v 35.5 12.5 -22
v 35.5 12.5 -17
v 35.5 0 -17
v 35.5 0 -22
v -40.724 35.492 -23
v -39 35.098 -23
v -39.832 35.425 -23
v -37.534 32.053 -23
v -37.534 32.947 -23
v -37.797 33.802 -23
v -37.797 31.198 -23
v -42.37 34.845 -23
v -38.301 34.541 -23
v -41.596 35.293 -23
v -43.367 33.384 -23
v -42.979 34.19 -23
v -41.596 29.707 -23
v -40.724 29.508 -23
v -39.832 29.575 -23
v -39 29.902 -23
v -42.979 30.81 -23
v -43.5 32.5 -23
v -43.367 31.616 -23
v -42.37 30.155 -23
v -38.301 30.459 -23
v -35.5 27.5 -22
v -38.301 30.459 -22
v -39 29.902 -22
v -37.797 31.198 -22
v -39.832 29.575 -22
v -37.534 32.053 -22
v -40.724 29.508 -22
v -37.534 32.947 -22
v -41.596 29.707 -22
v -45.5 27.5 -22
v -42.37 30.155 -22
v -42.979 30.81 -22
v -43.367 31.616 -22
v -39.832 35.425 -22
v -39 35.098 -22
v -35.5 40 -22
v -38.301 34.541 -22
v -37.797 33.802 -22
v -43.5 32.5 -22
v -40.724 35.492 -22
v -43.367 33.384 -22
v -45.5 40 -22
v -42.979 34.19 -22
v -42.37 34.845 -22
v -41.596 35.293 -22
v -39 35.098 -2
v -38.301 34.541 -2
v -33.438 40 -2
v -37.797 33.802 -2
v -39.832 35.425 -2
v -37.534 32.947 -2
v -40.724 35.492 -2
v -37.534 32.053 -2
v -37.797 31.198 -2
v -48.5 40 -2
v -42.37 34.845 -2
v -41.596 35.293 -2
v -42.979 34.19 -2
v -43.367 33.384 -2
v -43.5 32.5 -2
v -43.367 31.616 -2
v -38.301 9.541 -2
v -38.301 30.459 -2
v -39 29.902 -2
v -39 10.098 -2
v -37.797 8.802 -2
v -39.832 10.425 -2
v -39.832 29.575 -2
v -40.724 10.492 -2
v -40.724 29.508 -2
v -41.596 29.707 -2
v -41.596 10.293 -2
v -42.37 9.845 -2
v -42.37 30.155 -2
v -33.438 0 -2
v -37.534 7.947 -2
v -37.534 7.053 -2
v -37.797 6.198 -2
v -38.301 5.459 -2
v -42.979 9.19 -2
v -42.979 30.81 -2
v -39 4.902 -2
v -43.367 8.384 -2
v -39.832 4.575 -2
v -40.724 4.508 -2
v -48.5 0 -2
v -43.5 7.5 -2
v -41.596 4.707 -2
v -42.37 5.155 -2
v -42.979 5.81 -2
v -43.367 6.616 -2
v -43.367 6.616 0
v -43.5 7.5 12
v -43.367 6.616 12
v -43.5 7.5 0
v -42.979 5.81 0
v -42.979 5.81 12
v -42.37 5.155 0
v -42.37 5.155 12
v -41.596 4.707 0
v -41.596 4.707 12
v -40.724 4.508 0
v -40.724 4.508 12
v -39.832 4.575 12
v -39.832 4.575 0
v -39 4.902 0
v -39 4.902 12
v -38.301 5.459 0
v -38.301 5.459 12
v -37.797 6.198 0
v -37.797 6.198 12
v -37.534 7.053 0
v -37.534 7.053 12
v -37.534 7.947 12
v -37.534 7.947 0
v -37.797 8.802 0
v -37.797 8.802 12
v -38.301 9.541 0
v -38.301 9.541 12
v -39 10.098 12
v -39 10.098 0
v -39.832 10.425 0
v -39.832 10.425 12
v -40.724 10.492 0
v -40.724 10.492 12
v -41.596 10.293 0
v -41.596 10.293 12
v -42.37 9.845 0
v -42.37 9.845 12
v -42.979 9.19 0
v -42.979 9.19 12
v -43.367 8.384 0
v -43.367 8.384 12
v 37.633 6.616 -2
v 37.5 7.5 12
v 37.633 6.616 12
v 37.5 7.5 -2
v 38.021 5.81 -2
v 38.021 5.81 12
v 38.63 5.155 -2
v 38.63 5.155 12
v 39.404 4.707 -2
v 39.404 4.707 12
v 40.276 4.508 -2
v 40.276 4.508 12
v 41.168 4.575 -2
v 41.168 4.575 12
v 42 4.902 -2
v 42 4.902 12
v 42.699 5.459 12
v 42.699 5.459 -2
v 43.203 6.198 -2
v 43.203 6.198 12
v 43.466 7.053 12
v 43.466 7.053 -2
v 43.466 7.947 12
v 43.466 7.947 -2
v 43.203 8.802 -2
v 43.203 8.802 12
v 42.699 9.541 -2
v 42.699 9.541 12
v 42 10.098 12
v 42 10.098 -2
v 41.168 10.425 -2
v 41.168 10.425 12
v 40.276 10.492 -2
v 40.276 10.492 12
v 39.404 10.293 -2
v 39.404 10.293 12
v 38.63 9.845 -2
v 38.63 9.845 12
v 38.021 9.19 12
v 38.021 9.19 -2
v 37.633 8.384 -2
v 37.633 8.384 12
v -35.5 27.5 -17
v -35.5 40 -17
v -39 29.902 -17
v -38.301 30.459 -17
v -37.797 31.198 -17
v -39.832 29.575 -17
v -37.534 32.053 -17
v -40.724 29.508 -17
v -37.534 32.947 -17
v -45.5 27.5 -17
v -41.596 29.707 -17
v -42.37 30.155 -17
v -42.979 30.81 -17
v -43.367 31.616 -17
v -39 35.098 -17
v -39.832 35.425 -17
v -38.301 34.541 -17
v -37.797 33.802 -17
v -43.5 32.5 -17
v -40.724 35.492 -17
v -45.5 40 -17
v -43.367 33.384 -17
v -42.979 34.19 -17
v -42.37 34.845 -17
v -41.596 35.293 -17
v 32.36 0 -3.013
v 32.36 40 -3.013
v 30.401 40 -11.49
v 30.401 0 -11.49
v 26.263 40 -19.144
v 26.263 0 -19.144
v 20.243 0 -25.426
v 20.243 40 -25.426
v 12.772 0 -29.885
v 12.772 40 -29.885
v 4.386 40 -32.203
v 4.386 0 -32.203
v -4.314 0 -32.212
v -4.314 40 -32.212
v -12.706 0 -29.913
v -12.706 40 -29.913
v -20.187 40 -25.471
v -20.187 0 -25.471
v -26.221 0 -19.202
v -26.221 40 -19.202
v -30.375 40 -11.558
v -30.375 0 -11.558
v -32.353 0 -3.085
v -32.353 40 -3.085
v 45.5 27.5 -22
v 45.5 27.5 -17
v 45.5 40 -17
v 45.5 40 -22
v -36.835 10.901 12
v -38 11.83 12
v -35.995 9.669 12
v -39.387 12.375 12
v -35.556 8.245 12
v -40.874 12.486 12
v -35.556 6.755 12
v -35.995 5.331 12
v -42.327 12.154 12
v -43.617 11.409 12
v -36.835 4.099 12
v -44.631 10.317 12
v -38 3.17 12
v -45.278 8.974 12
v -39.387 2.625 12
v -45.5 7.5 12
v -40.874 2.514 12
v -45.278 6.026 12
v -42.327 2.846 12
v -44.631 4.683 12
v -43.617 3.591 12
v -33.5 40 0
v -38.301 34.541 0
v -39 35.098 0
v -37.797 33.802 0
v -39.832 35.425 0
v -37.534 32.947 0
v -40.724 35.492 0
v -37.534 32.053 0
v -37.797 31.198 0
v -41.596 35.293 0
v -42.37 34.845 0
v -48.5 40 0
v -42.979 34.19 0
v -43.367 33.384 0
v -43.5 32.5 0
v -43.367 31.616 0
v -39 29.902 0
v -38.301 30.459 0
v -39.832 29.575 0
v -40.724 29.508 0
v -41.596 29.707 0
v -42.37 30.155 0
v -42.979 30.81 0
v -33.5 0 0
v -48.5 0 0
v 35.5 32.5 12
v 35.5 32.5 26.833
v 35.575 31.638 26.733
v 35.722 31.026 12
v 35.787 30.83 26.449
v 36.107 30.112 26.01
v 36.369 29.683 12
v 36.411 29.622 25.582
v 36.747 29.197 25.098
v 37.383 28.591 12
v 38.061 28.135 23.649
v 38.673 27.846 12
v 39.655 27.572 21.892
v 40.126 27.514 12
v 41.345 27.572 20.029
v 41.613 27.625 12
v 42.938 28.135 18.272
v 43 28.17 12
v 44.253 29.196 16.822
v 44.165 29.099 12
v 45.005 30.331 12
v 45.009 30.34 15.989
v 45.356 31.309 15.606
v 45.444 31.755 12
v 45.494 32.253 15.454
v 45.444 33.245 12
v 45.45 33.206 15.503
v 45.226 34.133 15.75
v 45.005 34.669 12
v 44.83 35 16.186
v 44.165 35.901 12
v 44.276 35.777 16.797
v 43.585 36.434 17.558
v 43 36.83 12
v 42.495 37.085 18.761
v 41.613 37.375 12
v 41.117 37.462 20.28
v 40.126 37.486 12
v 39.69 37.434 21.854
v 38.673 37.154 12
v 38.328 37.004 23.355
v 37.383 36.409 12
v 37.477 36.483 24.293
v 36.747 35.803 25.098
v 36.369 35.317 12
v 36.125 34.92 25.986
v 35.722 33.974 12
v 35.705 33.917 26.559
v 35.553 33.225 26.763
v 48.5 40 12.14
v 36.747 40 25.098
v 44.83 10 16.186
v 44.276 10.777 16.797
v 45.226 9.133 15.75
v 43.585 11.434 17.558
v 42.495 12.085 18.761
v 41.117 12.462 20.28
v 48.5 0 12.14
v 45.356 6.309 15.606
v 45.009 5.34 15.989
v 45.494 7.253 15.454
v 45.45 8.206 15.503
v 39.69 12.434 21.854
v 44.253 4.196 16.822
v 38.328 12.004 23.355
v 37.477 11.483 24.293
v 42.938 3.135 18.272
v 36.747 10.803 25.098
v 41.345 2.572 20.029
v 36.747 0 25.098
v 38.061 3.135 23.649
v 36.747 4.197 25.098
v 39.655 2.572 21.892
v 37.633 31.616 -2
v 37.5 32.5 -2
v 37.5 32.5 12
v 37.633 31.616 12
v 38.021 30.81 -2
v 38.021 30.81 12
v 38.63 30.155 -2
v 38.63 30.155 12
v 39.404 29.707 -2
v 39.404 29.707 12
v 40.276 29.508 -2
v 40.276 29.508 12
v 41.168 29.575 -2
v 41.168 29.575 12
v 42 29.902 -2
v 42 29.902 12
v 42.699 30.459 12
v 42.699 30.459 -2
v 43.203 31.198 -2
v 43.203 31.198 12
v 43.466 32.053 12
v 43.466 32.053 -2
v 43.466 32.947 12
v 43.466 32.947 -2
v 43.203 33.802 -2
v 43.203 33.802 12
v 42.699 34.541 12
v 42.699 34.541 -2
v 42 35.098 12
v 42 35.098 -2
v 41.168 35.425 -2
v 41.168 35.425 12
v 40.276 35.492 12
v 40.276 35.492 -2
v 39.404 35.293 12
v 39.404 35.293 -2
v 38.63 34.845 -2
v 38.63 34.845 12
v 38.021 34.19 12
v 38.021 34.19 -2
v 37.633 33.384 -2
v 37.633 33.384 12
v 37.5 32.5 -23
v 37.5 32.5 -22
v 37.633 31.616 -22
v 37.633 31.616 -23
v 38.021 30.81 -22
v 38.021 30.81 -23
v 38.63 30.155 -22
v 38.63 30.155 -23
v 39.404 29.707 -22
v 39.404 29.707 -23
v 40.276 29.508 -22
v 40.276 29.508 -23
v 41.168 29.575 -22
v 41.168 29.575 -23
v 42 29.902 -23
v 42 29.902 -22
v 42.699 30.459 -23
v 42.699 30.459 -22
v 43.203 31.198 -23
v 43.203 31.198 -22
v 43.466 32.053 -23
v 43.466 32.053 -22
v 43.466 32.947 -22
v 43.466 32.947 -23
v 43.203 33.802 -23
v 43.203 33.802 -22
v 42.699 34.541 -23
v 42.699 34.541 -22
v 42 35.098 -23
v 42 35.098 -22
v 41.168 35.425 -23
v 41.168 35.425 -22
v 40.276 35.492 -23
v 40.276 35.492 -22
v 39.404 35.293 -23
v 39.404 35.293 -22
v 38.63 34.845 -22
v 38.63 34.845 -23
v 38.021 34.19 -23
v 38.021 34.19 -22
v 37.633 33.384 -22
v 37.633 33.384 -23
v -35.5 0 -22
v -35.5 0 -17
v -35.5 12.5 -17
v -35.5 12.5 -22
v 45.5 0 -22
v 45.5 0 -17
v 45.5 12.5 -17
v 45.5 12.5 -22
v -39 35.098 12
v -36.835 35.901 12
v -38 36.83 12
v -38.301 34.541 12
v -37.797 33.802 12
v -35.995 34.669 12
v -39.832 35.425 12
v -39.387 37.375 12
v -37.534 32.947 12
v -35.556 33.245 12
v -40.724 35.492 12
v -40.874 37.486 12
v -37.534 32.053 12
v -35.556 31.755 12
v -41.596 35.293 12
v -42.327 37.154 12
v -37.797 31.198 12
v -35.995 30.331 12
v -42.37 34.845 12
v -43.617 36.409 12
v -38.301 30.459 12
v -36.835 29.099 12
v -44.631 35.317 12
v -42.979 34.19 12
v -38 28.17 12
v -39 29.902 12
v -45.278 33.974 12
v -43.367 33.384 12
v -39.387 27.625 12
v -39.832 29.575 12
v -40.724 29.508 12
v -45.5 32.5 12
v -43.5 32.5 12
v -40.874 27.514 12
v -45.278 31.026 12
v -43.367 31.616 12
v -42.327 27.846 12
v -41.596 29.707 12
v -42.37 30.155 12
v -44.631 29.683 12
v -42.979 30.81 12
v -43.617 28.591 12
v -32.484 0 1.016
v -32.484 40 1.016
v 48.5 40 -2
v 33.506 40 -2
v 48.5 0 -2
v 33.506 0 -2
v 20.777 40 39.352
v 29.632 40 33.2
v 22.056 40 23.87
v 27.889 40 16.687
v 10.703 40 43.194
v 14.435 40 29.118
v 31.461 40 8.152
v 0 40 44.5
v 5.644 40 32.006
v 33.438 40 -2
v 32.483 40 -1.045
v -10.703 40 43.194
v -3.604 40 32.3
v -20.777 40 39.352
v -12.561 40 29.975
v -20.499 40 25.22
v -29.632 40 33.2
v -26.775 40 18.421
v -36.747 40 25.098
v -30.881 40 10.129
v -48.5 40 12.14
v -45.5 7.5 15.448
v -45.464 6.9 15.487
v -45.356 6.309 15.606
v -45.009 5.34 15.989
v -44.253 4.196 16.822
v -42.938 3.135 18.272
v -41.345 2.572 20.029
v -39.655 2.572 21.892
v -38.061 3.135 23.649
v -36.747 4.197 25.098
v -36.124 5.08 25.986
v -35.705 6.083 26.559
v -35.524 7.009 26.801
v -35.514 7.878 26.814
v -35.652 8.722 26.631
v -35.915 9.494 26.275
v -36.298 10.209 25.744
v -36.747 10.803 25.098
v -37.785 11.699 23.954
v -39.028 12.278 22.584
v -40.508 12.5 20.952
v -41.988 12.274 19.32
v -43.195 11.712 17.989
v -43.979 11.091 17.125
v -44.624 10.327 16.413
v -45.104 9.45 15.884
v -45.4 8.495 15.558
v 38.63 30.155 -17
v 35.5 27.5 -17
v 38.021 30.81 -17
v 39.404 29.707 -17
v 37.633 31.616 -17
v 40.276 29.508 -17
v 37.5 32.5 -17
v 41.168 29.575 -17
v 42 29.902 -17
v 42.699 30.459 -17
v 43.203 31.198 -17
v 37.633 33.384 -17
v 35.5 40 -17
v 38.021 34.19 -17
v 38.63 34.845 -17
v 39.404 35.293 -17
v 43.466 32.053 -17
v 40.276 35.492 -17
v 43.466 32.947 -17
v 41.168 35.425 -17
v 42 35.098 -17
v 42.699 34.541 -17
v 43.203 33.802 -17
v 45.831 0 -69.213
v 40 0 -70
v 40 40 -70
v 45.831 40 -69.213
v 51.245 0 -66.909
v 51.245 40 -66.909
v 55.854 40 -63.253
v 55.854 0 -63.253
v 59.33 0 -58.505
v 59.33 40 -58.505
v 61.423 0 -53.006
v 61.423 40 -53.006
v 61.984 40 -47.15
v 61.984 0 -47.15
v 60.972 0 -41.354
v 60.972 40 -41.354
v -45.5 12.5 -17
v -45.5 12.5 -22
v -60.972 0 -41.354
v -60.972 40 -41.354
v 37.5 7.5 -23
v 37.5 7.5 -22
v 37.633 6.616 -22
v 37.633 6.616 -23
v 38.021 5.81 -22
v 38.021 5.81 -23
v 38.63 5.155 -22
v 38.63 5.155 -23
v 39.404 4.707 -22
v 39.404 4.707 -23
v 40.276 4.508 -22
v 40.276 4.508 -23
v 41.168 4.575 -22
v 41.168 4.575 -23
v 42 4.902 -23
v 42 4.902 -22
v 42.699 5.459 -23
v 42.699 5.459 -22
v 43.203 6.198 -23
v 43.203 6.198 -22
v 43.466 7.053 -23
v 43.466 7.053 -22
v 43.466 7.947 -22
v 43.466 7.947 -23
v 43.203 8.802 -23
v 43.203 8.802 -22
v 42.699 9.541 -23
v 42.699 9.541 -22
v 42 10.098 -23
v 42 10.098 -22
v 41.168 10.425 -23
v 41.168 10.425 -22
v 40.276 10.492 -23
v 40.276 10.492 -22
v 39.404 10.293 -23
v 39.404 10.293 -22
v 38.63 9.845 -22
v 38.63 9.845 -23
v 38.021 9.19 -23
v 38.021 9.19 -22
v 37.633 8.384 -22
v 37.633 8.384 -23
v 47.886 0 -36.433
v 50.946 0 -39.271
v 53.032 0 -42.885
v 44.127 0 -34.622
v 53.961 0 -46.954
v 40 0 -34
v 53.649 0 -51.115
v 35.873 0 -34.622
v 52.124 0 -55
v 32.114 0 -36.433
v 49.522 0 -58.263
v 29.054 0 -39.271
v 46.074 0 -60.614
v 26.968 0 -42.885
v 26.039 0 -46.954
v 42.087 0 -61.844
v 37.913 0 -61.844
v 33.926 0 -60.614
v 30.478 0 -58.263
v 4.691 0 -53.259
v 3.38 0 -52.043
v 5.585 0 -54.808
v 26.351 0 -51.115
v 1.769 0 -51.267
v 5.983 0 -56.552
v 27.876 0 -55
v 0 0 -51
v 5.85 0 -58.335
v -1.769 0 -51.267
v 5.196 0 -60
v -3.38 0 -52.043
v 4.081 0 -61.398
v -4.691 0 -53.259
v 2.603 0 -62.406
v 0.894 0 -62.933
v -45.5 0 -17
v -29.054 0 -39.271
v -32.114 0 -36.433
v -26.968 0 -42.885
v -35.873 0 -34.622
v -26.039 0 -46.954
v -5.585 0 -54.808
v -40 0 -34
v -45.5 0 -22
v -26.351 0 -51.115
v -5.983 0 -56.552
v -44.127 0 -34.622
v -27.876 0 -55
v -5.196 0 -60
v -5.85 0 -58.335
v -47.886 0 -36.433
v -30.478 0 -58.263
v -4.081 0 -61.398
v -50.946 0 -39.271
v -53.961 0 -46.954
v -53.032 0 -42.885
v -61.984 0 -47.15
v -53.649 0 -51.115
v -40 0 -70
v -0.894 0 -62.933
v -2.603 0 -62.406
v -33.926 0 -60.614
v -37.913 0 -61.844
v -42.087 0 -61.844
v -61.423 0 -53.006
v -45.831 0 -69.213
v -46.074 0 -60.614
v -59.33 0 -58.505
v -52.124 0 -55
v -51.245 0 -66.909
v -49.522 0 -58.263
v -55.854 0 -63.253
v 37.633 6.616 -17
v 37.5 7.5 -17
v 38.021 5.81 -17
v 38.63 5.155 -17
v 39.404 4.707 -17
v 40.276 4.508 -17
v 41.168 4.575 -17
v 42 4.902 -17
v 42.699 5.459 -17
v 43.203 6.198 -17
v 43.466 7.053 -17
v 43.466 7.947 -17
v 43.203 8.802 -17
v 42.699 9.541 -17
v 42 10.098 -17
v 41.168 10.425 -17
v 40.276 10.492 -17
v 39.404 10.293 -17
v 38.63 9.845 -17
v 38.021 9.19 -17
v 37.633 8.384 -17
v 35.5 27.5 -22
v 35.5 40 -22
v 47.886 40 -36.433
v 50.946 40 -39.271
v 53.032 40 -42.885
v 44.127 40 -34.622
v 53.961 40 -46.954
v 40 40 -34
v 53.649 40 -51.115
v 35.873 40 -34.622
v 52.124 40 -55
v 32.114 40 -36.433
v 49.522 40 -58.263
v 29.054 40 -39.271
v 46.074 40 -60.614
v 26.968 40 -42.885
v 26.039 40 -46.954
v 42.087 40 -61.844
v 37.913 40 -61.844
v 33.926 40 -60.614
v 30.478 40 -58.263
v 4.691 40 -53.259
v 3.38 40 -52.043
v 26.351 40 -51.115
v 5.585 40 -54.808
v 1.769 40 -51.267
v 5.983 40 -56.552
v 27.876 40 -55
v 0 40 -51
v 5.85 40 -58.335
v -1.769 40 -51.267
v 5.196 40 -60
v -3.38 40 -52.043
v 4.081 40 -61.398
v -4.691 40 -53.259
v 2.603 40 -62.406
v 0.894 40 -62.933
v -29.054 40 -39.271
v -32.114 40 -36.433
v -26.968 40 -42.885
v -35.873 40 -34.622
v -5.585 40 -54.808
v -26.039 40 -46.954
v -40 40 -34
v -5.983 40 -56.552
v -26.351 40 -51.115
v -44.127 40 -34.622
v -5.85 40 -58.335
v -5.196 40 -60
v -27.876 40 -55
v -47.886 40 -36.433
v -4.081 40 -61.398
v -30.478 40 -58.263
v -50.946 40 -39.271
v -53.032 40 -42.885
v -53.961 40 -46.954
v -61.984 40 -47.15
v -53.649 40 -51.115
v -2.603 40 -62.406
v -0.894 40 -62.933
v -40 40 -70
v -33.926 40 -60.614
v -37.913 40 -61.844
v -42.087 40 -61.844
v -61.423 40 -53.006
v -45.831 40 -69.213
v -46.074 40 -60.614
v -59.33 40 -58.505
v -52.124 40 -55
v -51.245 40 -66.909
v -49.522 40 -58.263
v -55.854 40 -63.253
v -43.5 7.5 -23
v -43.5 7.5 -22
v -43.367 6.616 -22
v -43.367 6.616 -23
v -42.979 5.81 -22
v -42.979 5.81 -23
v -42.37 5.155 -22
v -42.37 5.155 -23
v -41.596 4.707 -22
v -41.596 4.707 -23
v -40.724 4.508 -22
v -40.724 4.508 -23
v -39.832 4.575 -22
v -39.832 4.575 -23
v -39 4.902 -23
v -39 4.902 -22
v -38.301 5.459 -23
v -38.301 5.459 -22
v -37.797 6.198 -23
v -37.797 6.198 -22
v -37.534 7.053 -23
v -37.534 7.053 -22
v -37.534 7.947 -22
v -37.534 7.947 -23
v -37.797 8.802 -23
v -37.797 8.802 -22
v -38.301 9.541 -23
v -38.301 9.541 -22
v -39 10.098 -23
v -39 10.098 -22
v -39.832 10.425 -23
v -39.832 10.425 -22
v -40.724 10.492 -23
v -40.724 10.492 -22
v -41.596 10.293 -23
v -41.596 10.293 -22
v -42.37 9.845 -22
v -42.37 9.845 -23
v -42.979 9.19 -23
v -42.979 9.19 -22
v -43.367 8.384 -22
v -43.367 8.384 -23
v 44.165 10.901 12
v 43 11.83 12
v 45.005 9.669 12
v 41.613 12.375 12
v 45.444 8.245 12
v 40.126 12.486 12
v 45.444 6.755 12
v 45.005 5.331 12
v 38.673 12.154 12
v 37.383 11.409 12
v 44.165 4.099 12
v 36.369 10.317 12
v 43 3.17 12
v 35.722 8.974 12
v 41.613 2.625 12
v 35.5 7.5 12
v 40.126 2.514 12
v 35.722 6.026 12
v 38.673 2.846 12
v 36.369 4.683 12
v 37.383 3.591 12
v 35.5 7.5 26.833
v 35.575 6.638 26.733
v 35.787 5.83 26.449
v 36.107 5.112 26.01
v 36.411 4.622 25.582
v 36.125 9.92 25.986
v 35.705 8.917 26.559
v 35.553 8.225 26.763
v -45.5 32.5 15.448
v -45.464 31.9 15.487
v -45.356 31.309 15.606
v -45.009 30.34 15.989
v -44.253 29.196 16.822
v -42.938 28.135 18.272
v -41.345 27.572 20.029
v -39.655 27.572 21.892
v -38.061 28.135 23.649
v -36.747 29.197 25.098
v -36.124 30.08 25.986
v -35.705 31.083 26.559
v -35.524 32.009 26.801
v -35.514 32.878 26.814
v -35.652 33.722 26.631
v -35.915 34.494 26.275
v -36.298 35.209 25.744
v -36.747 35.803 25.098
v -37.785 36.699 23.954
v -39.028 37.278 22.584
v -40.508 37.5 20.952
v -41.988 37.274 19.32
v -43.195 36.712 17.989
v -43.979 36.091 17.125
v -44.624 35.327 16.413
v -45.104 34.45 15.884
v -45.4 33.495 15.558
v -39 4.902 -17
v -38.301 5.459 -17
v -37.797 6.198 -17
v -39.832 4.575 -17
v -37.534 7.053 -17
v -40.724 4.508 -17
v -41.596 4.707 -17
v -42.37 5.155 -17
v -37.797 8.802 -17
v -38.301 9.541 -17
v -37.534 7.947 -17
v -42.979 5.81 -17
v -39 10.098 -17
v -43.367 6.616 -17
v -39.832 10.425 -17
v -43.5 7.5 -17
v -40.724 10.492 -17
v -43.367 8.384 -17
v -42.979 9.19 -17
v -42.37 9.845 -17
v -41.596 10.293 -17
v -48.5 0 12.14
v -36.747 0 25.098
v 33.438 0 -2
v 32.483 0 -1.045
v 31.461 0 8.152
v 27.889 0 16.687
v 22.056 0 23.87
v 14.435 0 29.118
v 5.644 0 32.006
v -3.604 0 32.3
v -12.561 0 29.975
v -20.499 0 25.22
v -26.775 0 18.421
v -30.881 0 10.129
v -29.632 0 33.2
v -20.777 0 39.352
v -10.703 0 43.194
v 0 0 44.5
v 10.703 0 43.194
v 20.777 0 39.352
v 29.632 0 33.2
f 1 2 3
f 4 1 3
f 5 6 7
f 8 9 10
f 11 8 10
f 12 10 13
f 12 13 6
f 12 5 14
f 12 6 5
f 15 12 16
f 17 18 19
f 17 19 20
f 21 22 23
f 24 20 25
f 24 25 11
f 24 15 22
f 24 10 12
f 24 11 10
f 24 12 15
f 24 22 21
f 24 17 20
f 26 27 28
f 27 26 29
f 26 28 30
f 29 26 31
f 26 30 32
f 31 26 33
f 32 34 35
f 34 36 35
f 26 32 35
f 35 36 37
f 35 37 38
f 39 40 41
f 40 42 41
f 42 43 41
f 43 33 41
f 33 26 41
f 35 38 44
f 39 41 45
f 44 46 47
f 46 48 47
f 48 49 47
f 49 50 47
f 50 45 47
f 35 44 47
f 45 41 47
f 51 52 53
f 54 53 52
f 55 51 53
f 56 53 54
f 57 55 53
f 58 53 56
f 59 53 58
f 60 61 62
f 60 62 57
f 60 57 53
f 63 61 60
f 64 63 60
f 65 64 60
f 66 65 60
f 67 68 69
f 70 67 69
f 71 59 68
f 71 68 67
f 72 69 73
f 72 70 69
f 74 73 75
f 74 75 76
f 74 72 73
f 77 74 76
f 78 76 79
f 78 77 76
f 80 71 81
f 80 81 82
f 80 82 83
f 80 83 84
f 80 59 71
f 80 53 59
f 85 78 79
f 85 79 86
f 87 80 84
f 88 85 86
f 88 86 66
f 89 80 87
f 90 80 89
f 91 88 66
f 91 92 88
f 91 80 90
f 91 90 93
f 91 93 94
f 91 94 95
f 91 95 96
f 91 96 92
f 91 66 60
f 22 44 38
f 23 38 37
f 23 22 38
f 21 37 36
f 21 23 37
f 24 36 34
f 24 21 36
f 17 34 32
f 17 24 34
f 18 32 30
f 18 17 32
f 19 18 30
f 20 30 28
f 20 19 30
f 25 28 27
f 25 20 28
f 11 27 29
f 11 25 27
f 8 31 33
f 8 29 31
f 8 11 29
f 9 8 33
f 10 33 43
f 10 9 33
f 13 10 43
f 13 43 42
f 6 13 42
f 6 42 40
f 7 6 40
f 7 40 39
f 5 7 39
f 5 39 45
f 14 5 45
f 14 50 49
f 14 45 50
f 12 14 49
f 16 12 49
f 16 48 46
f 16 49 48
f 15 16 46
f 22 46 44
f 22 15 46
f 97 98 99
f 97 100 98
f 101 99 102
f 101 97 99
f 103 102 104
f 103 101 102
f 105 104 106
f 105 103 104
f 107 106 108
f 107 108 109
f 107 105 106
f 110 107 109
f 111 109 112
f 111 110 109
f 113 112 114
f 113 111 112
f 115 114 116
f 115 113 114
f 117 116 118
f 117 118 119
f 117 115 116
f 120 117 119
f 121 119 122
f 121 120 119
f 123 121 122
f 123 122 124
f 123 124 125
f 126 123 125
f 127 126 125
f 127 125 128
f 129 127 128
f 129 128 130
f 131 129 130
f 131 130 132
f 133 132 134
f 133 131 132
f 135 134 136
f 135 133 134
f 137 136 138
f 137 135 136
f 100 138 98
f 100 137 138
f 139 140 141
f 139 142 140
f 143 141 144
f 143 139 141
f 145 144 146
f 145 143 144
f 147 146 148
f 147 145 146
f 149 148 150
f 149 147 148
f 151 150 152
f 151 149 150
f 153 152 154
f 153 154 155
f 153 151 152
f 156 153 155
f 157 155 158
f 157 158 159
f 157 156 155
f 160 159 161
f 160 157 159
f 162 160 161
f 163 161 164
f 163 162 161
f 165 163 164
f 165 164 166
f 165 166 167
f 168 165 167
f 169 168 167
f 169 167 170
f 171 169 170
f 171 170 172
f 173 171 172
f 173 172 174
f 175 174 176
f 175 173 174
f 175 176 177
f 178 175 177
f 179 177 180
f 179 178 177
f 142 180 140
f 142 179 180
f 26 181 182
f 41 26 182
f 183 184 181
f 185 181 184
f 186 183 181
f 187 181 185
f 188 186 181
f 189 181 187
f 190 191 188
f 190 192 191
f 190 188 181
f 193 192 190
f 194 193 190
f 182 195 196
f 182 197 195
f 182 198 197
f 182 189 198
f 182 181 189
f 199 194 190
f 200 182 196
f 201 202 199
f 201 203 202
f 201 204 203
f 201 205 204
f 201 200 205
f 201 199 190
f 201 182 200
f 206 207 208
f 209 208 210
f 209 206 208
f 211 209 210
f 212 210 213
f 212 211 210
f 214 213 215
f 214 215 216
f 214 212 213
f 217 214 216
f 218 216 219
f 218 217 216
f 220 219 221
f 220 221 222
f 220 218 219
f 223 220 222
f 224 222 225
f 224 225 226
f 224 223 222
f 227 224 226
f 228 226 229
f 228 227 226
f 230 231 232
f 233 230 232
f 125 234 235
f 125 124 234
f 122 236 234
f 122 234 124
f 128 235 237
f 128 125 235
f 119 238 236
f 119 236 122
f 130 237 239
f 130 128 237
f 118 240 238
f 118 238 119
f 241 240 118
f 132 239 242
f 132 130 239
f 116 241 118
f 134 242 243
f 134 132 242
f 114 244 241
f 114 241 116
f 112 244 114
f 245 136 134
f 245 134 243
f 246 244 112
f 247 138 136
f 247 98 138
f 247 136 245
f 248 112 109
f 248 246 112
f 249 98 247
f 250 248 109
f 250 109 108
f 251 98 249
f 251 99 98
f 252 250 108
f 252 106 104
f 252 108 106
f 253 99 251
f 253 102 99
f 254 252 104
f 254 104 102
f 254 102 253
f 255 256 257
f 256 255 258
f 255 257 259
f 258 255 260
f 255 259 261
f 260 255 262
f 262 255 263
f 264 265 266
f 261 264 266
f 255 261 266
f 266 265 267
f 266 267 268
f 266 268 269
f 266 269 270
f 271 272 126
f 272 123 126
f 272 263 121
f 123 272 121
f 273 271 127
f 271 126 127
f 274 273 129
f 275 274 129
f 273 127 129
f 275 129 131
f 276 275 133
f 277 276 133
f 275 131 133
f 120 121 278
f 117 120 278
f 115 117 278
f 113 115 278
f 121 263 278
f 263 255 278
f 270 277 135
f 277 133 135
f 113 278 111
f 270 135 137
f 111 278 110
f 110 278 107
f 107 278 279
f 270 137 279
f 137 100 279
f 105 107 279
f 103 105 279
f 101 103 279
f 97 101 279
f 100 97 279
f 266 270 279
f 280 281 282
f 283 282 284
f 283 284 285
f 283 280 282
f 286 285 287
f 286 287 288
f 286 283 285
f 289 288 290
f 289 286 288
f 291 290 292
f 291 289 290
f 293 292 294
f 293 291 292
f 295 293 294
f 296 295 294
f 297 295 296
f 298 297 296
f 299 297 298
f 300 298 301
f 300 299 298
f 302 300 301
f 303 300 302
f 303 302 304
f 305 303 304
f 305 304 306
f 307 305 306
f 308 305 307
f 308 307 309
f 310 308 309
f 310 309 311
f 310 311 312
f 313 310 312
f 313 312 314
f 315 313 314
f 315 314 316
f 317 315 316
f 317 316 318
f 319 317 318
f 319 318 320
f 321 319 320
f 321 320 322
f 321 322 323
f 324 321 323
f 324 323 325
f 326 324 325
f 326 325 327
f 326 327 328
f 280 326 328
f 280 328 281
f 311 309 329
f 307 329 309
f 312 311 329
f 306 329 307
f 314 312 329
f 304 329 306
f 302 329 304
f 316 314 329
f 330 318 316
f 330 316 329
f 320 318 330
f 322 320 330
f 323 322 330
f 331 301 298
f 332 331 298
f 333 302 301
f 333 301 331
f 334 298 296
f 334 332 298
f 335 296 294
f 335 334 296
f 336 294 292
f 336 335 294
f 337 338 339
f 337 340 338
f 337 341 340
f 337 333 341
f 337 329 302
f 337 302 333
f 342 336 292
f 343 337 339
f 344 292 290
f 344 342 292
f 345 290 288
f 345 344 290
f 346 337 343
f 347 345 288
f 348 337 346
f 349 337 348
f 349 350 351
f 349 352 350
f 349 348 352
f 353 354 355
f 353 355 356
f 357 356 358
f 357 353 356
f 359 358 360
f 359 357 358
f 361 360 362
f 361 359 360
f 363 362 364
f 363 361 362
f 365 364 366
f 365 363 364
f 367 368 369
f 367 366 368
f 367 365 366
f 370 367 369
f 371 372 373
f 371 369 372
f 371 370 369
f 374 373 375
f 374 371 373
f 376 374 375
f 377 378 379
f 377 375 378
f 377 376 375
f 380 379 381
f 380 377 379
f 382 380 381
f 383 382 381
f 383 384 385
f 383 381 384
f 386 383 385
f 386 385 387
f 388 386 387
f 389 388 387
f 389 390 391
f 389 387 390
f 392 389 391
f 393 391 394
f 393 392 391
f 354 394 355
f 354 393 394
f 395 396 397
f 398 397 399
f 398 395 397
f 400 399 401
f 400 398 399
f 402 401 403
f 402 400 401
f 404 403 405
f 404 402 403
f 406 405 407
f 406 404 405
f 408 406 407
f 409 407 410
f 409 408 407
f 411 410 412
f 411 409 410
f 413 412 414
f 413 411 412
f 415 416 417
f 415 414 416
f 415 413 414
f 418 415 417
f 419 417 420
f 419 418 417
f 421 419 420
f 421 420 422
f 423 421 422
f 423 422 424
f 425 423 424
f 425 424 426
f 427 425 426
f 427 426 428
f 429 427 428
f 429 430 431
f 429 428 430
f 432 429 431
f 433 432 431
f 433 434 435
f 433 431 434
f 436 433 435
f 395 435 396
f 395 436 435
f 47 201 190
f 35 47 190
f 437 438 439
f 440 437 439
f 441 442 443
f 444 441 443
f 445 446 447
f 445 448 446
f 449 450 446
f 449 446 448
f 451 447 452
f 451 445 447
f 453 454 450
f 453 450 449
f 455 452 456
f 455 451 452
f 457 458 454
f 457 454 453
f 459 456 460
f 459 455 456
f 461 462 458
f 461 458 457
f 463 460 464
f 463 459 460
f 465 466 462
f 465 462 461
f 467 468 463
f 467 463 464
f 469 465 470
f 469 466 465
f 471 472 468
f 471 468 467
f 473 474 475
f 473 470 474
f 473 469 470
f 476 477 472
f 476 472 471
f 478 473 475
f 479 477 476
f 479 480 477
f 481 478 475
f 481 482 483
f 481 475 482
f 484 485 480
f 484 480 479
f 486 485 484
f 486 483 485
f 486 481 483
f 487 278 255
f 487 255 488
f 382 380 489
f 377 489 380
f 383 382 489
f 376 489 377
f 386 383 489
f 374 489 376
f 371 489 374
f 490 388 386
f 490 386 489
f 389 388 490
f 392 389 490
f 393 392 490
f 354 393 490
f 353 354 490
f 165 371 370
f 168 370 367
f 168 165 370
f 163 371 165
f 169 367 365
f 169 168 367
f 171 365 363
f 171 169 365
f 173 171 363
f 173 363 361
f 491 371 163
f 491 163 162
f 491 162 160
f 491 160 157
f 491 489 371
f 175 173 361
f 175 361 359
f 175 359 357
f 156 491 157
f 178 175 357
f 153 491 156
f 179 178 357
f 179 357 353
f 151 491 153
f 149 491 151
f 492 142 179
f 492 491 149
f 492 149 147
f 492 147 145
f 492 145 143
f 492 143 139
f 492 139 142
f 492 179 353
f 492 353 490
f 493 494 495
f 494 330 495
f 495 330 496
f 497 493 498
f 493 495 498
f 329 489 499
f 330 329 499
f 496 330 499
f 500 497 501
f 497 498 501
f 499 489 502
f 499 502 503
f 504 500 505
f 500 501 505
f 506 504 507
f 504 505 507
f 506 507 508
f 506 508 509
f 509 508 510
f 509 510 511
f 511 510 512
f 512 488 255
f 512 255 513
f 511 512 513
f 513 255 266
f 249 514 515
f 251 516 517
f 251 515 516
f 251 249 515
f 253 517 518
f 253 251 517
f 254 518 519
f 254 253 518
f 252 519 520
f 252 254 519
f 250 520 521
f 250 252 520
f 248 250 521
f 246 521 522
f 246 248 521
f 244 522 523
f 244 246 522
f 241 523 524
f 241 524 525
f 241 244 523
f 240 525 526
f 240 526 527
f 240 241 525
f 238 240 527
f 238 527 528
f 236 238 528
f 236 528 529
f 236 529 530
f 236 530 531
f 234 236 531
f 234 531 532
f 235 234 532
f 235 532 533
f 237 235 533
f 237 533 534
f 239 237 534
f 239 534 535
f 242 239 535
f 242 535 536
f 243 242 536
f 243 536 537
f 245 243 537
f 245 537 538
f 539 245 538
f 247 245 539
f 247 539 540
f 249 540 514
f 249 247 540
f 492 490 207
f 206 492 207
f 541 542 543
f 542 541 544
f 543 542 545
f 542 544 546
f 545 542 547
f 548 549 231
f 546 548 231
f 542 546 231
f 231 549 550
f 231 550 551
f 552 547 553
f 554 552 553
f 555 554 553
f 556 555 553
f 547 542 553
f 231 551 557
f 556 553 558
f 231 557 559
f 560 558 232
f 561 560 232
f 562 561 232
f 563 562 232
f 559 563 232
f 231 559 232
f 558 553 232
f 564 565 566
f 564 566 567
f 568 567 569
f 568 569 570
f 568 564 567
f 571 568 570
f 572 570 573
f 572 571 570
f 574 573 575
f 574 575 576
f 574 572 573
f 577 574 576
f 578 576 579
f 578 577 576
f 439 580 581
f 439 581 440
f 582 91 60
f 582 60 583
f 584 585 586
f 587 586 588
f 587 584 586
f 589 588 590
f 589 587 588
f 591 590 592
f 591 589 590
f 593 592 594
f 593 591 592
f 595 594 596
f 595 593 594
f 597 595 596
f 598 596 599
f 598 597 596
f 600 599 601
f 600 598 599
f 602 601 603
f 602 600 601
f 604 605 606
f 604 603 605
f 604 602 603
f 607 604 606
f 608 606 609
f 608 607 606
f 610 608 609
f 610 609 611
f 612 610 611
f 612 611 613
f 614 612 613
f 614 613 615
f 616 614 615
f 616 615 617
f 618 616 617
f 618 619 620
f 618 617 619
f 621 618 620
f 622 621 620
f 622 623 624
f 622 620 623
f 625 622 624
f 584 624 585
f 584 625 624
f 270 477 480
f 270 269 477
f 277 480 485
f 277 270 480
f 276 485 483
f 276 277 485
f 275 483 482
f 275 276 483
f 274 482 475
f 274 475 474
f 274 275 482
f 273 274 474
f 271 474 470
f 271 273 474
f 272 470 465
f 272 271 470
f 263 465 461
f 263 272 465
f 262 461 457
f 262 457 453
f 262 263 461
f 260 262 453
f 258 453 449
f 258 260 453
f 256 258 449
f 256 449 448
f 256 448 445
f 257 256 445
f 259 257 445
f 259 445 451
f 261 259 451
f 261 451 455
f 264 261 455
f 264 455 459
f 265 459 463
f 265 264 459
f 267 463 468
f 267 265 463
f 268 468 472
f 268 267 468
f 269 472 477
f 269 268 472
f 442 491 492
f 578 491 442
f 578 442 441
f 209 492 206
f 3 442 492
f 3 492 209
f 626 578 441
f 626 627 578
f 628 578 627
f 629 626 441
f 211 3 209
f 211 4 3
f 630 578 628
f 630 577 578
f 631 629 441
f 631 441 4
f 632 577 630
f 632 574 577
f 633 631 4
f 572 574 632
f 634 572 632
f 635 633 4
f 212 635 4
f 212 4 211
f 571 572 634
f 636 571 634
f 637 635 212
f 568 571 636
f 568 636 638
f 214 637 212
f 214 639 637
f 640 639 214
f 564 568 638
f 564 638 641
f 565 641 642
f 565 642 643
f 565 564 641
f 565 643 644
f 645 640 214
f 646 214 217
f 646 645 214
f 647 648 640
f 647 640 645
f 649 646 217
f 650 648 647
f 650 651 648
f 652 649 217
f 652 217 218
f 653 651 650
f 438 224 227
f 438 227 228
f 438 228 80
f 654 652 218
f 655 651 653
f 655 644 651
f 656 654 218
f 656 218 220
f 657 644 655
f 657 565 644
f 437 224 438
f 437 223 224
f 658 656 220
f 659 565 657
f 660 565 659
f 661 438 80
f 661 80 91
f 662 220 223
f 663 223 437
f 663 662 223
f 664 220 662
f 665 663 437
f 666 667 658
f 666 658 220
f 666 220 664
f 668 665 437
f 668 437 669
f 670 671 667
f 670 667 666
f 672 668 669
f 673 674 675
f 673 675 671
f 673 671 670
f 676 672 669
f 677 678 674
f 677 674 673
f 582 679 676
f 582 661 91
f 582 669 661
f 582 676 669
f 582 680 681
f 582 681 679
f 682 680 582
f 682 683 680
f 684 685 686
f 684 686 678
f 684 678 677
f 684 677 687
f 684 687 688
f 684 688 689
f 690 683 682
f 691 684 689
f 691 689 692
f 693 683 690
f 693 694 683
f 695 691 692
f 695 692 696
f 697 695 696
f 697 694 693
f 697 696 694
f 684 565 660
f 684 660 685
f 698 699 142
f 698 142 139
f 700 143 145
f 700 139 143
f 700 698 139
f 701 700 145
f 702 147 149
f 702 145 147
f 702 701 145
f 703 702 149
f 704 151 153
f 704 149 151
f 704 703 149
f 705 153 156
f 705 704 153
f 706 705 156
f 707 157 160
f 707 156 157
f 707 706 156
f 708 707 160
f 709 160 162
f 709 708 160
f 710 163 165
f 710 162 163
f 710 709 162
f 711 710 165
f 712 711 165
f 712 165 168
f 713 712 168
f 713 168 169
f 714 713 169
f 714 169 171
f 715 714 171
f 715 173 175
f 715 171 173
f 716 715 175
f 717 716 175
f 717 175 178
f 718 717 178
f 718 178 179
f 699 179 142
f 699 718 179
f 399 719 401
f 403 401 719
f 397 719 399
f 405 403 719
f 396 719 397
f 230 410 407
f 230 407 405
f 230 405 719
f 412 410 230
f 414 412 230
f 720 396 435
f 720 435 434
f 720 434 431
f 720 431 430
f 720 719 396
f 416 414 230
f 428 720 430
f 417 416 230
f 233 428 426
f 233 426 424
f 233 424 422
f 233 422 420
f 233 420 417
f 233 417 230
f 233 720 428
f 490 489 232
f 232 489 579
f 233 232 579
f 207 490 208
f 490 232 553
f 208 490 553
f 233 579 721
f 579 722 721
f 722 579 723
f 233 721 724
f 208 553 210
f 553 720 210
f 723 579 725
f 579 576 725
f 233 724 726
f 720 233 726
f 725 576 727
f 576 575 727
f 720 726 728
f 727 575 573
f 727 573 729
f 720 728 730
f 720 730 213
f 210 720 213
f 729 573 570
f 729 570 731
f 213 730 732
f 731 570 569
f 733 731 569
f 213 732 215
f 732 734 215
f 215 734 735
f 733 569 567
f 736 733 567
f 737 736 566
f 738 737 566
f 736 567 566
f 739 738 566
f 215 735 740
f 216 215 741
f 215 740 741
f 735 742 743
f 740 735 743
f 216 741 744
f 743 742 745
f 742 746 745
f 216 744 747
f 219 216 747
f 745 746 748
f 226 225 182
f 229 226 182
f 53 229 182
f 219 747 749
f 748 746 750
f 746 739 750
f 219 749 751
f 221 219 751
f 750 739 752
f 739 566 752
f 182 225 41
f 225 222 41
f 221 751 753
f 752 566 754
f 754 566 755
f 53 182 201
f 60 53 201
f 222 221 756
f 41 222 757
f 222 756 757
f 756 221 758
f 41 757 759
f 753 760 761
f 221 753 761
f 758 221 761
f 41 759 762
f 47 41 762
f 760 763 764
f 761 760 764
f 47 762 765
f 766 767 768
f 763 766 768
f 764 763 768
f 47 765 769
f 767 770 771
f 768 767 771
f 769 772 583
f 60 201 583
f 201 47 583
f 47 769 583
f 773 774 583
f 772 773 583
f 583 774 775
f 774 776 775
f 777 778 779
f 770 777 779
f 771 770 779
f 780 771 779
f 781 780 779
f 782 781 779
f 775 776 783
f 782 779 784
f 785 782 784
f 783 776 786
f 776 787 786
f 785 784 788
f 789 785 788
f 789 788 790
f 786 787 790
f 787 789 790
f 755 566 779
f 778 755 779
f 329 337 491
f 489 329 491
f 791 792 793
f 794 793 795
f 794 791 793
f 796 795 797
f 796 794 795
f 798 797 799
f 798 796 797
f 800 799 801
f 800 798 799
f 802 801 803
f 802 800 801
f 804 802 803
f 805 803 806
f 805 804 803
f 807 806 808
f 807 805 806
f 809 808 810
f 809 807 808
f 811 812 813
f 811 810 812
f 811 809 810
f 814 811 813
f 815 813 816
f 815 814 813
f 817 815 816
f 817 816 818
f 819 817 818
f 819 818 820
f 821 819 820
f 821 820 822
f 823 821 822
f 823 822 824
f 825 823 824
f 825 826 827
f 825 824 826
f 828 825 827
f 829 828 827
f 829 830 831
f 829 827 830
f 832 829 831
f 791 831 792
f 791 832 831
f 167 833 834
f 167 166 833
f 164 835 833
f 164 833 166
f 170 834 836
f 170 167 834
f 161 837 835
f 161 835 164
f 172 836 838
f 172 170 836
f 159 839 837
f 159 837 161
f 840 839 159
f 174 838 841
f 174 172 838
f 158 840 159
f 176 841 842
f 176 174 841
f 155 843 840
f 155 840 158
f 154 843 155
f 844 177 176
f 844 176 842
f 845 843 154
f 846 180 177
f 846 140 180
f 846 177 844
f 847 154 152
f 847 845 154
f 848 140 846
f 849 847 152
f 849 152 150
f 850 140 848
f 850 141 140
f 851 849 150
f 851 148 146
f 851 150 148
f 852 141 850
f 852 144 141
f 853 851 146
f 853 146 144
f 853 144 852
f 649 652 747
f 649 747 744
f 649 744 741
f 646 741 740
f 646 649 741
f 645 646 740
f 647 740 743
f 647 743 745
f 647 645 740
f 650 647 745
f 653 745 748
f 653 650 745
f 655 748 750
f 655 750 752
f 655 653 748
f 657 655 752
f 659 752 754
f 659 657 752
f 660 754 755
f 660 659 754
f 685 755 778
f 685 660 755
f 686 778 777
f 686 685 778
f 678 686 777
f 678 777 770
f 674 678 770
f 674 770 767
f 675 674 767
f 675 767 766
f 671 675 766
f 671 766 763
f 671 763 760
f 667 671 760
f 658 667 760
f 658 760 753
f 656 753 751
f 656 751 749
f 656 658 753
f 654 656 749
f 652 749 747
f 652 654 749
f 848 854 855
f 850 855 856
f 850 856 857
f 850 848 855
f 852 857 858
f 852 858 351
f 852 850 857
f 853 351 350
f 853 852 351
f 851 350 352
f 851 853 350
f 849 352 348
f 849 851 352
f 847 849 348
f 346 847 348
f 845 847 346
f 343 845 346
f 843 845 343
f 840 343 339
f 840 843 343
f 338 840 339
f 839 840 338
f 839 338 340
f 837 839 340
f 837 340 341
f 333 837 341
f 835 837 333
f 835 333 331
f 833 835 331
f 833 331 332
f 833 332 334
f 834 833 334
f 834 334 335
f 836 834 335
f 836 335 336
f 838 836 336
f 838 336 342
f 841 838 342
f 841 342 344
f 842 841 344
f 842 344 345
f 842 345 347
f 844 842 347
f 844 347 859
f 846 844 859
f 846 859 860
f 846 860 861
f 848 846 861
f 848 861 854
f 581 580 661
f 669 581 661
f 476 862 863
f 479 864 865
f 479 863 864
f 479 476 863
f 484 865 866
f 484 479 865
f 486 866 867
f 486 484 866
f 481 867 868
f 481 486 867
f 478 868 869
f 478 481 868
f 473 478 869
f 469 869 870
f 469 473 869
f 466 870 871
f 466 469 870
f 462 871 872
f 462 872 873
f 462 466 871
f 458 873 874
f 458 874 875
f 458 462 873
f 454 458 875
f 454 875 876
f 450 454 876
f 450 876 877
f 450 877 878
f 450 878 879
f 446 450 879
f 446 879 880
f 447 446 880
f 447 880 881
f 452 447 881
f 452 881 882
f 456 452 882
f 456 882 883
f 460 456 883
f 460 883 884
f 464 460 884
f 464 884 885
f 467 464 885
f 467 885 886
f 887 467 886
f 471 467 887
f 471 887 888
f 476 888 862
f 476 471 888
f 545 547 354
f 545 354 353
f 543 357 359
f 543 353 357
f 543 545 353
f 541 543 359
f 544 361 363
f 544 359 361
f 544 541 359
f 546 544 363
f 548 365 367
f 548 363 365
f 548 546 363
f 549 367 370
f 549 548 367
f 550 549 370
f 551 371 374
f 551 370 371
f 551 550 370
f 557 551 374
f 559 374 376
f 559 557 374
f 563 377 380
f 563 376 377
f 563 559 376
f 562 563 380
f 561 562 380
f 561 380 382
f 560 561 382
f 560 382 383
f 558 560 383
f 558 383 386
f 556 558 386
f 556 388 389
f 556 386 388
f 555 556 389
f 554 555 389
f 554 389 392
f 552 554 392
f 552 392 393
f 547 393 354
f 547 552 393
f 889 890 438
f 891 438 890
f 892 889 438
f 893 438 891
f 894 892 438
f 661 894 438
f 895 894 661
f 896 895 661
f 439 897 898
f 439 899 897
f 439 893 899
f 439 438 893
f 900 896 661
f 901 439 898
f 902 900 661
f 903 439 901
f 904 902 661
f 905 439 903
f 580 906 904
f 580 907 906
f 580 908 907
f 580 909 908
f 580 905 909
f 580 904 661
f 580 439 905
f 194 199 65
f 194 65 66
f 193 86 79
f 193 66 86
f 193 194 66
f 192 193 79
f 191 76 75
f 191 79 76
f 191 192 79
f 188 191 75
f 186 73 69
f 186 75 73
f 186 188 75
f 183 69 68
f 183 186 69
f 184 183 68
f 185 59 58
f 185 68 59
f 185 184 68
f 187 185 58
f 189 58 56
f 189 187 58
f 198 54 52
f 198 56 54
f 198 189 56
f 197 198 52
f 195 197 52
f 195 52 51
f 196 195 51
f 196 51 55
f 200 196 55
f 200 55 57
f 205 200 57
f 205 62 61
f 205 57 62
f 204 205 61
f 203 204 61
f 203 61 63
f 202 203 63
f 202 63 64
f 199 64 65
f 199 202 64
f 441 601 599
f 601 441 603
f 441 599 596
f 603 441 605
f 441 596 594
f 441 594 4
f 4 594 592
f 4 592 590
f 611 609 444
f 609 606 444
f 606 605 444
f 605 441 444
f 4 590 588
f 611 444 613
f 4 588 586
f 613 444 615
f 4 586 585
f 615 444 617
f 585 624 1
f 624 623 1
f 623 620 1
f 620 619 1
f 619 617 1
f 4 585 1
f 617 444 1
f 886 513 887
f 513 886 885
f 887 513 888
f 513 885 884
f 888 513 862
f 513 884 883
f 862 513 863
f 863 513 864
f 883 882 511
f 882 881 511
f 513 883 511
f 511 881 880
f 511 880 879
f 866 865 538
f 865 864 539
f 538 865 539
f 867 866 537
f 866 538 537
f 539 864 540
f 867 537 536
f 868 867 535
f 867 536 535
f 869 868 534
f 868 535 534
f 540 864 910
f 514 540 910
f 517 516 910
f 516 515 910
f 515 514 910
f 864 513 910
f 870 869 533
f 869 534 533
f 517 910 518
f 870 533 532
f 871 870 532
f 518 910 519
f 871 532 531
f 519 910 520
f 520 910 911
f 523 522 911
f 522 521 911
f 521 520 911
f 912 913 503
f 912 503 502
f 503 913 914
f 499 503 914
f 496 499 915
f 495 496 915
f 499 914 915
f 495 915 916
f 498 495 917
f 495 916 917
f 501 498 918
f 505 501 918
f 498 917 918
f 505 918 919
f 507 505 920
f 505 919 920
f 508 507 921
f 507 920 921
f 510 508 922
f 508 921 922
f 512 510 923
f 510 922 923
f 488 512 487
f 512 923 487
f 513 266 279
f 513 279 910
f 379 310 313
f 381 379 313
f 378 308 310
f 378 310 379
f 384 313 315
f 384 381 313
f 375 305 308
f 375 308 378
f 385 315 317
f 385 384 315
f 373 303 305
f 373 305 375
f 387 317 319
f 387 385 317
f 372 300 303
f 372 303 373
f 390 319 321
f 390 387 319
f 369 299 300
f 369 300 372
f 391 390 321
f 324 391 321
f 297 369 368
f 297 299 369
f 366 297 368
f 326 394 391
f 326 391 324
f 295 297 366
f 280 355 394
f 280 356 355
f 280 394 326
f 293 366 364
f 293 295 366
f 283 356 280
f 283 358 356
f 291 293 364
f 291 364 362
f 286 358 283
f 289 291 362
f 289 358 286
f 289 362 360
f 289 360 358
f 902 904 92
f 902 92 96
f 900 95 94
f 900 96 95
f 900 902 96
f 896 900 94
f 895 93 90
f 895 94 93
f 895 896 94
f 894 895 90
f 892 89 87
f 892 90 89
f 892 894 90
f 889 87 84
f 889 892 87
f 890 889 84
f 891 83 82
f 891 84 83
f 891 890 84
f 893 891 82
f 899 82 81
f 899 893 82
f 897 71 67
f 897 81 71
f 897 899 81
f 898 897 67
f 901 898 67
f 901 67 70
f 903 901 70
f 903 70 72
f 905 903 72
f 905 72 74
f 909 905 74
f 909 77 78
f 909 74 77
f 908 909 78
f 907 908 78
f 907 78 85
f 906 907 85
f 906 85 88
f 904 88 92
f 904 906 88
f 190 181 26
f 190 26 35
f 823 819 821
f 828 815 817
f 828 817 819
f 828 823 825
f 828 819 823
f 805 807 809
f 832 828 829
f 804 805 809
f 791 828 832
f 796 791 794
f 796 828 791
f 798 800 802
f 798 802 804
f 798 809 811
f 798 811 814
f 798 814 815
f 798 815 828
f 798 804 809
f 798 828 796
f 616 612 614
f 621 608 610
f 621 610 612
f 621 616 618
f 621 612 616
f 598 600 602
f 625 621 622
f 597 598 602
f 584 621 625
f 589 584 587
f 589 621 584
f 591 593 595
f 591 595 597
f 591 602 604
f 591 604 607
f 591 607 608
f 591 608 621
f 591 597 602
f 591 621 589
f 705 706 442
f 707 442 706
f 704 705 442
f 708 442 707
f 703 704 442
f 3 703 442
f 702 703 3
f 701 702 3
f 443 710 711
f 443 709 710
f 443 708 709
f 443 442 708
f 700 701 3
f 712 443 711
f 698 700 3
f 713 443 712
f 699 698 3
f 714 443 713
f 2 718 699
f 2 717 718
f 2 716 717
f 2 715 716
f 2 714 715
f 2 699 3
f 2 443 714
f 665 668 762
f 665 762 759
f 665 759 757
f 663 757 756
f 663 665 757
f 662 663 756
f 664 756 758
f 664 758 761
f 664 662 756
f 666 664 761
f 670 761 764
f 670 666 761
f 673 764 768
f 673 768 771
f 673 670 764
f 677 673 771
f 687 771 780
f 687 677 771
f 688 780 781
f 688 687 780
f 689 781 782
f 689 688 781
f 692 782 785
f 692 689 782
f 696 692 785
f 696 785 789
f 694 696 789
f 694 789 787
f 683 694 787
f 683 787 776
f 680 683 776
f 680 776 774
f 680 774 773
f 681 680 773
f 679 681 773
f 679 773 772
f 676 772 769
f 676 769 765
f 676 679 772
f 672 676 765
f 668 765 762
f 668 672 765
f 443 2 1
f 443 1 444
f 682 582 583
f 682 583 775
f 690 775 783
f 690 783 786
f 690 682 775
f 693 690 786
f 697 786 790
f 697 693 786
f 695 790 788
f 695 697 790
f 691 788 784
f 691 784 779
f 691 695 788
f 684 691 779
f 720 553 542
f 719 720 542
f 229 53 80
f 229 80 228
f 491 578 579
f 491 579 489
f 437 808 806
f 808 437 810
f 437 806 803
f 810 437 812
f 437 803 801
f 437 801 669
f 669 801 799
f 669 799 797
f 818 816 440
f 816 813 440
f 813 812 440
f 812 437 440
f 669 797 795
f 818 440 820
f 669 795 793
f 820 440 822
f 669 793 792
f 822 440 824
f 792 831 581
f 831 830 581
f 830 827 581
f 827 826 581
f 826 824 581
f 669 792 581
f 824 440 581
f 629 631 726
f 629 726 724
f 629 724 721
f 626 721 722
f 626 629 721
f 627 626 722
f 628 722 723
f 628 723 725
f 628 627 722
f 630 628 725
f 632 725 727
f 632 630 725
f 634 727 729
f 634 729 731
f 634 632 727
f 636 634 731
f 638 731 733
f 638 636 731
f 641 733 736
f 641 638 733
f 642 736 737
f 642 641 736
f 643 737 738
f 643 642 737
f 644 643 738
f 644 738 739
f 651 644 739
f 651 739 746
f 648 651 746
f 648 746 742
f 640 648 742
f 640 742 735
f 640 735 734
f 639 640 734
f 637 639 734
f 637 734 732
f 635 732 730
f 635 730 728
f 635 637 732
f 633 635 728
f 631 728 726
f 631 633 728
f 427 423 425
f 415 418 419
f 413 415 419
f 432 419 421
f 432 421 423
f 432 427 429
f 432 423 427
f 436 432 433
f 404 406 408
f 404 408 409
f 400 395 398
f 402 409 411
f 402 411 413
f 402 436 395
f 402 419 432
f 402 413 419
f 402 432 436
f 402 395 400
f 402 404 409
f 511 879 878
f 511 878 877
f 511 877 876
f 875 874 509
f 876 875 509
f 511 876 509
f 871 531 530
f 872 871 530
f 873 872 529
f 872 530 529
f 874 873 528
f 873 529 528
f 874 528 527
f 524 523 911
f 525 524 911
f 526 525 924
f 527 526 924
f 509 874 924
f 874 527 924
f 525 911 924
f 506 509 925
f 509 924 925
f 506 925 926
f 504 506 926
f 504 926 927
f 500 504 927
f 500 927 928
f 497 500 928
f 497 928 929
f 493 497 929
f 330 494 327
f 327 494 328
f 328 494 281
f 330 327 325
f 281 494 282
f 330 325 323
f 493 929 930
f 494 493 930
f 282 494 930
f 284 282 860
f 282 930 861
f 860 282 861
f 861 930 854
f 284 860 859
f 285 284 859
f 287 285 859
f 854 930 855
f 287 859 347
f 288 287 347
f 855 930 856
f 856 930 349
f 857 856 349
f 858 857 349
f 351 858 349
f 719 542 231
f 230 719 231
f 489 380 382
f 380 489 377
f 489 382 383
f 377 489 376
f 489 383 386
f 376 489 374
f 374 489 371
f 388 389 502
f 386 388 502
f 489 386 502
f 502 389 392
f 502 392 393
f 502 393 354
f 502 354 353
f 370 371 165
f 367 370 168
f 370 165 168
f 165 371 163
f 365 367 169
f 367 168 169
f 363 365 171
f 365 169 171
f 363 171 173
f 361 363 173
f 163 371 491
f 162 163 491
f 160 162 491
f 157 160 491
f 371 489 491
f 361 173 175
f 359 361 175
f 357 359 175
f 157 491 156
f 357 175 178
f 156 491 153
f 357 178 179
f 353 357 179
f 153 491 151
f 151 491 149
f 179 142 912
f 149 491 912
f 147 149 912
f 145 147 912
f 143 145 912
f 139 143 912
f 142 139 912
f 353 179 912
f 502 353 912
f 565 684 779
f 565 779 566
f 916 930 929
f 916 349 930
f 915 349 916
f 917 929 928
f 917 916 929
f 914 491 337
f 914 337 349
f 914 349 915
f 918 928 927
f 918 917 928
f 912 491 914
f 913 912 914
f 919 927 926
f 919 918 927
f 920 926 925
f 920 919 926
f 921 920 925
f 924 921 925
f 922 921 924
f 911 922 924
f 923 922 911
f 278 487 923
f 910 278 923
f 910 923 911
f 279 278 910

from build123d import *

# Parameters (mm, degrees)
SKETCH1_R               = 14
SKETCH1_R_2             = 6
BOSS_EXTRUDE1_DEPTH     = 40
BOSS_EXTRUDE2_DEPTH     = 40
SKETCH2_R               = 5
SKETCH2_R_2             = 3
CUT_EXTRUDE1_DEPTH      = 78.1
CUT_EXTRUDE2_DEPTH      = 111.308657901
CUT_EXTRUDE2_DEPTH_BACK = 35
SKETCH2_3_R             = 3
CUT_EXTRUDE3_DEPTH      = 5
CHAMFER2_SIZE           = 1
CHAMFER2_SIZE_2         = 1.067730124
CHAMFER3_SIZE           = 1


with BuildPart() as part:
    # Sketch1 → Boss-Extrude1 (new body)
    with BuildSketch(Plane(origin=(0, 0, 0), x_dir=(1, 0, 0), z_dir=(0, 1, 0))):
        with BuildLine():
            Line((-40, 70), (40, 70))
            ThreePointArc((40, 70), (57.751374155, 60.995719126), (60.97198842, 41.353519599))
            Line((60.97198842, 41.353519599), (48.5, 2))
            Line((48.5, 2), (32.438403167, 2))
            ThreePointArc((32.438403167, 2), (0, 32.5), (-32.438403167, 2))
            Line((-32.438403167, 2), (-48.5, 2))
            Line((-48.5, 2), (-60.97198842, 41.353519599))
            ThreePointArc((-60.97198842, 41.353519599), (-57.751374155, 60.995719126), (-40, 70))
        make_face()
        with Locations(Location((40, 48, 0), (0, 0, 270))):
            Circle(SKETCH1_R, mode=Mode.SUBTRACT)
        with Locations(Location((-40, 48, 0), (0, 0, 270))):
            Circle(SKETCH1_R, mode=Mode.SUBTRACT)
        with Locations(Location((0, 57, 0), (0, 0, 270))):
            Circle(SKETCH1_R_2, mode=Mode.SUBTRACT)
    extrude(amount=BOSS_EXTRUDE1_DEPTH)


with BuildPart() as body_2:
    # Sketch1<3> → Boss-Extrude2 (new, through all)
    with BuildSketch(Plane(origin=(0, 0, 0), x_dir=(1, 0, 0), z_dir=(0, 1, 0))):
        with BuildLine():
            Line((48.5, 2), (32.438403167, 2))
            ThreePointArc((32.438403167, 2), (1.000474159, -32.484597142), (-32.5, 0))
            Line((-32.5, 0), (-48.5, 0))
            Line((-48.5, 0), (-48.5, -12))
            Line((-48.5, -12), (-42.851487722, -12))
            ThreePointArc((-42.851487722, -12), (0, -44.5), (42.851487722, -12))
            Line((42.851487722, -12), (48.5, -12))
            Line((48.5, -12), (48.5, 2))
        make_face()
    extrude(amount=BOSS_EXTRUDE2_DEPTH)

    # Chamfer1
    # the kernel refuses this chamfer: 18, 9 mm, written as the material it adds along each edge
    with BuildSketch(Plane(origin=(-42.851487722, 0, 12), x_dir=(-1, 0, 0), z_dir=(0, 1, 0))) as chamfer1_piece_1_section:
        with BuildLine():
            Line((6.259138875, -0.533312536), (-6.588525819, 13.631757182))
            Line((-6.588525819, 13.631757182), (-6.885802285, 13.428713585))
            ThreePointArc((-6.885802285, 13.428713585), (-2.991055083, 6.960103108), (-0.346663721, -0.097078652))
            Line((-0.346663721, -0.097078652), (0, -0.36))
            ThreePointArc((0, -0.36), (3.129569437, -0.36), (6.259138875, -0.893312536))
            Line((6.259138875, -0.893312536), (6.259138875, -0.533312536))
        make_face()
    chamfer1_piece_1 = extrude(amount=40, mode=Mode.PRIVATE)
    chamfer1_piece_1 = split(chamfer1_piece_1, bisect_by=Plane(origin=(-48.5, 0, 12), z_dir=(1, 0, 0)), keep=Keep.TOP, mode=Mode.PRIVATE)
    add(chamfer1_piece_1)
    with BuildSketch(Plane(origin=(42.851487722, 0, 12), x_dir=(1, 0, 0), z_dir=(0, 1, 0))) as chamfer1_piece_2_section:
        with BuildLine():
            Line((6.259138875, 0.533312536), (-6.588525819, -13.631757182))
            Line((-6.588525819, -13.631757182), (-6.885802285, -13.428713585))
            ThreePointArc((-6.885802285, -13.428713585), (-2.991055083, -6.960103108), (-0.346663721, 0.097078652))
            Line((-0.346663721, 0.097078652), (0, 0.36))
            ThreePointArc((0, 0.36), (3.129569437, 0.36), (6.259138875, 0.893312536))
            Line((6.259138875, 0.893312536), (6.259138875, 0.533312536))
        make_face()
    chamfer1_piece_2 = extrude(amount=40, mode=Mode.PRIVATE)
    chamfer1_piece_2 = split(chamfer1_piece_2, bisect_by=Plane(origin=(48.5, 0, 12), z_dir=(-1, 0, 0)), keep=Keep.TOP, mode=Mode.PRIVATE)
    add(chamfer1_piece_2)

    # Sketch2 → Cut-Extrude1 (cut)
    # profile 1 of 4: a face of its own
    with BuildSketch(Plane.XY.offset(12)):
        with Locations(Location((-40.5, 32.5, 0), (0, 0, 180))):
            Circle(SKETCH2_R)
        with Locations(Location((-40.5, 32.5, 0), (0, 0, 180))):
            Circle(SKETCH2_R_2, mode=Mode.SUBTRACT)
    # profile 2 of 4: a face of its own
    with BuildSketch(Plane.XY.offset(12)):
        with Locations(Location((-40.5, 7.5, 0), (0, 0, 180))):
            Circle(SKETCH2_R)
        with Locations(Location((-40.5, 7.5, 0), (0, 0, 180))):
            Circle(SKETCH2_R_2, mode=Mode.SUBTRACT)
    # profile 3 of 4: a face of its own
    with BuildSketch(Plane.XY.offset(12)):
        with Locations(Location((40.5, 7.5, 0), (0, 0, 180))):
            Circle(SKETCH2_R)
        with Locations(Location((40.5, 7.5, 0), (0, 0, 180))):
            Circle(SKETCH2_R_2, mode=Mode.SUBTRACT)
    # profile 4 of 4: a face of its own
    with BuildSketch(Plane.XY.offset(12)):
        with Locations(Location((40.5, 32.5, 0), (0, 0, 180))):
            Circle(SKETCH2_R)
    extrude(amount=CUT_EXTRUDE1_DEPTH, mode=Mode.SUBTRACT)


with BuildPart() as cut_extrude2_tool:
    # Sketch2<3> → Cut-Extrude2 (new, two sides: drawn at the far end of the back side and taken through both)
    with BuildSketch(Plane.XY.offset(12).offset(-CUT_EXTRUDE2_DEPTH_BACK)):
        with Locations(Location((40.5, 7.5, 0), (0, 0, 180))):
            Circle(SKETCH2_3_R)
        with Locations(Location((-40.5, 32.5, 0), (0, 0, 180))):
            Circle(SKETCH2_3_R)
        with Locations(Location((-40.5, 7.5, 0), (0, 0, 180))):
            Circle(SKETCH2_3_R)
        with Locations(Location((40.5, 32.5, 0), (0, 0, 180))):
            Circle(SKETCH2_3_R)
    extrude(amount=CUT_EXTRUDE2_DEPTH + CUT_EXTRUDE2_DEPTH_BACK)


with BuildPart() as part_1:
    add(part.part)

    # Cut-Extrude2: cut by cut_extrude2_tool
    add(cut_extrude2_tool.part, mode=Mode.SUBTRACT)

    # Sketch3 → Cut-Extrude3 (cut)
    with BuildSketch(Plane.XY.offset(-17)):
        Polygon((-45.5, 37.5), (-45.5, 55.055829491), (-35.5, 55.055829491), (-35.5, 37.5), (-35.5, 27.5), (-45.5, 27.5), align=None)
        Polygon((-45.5, 2.5), (-45.5, 12.5), (-35.5, 12.5), (-35.5, 2.5), (-35.5, -15.733667286), (-45.5, -15.733667286), align=None)
        Polygon((35.5, -15.733667286), (35.5, 2.5), (35.5, 12.5), (45.5, 12.5), (45.5, 2.5), (45.5, -15.733667286), align=None)
        Polygon((35.5, 55.055829491), (35.5, 37.5), (35.5, 27.5), (45.5, 27.5), (45.5, 37.5), (45.5, 55.055829491), align=None)
    extrude(amount=-CUT_EXTRUDE3_DEPTH, mode=Mode.SUBTRACT)

    # Chamfer2
    # the kernel refuses this chamfer: 1.067730124, 1 mm, written as the material it takes off along each edge
    with BuildSketch(Plane(origin=(-32.438403167, -2.803300673, -2), x_dir=(-1, 0, 0), z_dir=(0, 1, 0))) as chamfer2_piece_1:
        with BuildLine():
            Line((CHAMFER2_SIZE, 0), (-0.085169492, -1.085169492))
            ThreePointArc((-0.085169492, -1.085169492), (-0.039316375, -0.559135608), (0, 0))
            Line((0, 0), (CHAMFER2_SIZE, 0))
        make_face()
    extrude(amount=45.606601345, mode=Mode.SUBTRACT)
    with BuildSketch(Plane(origin=(32.438403167, -2.75023745, -2), x_dir=(1, 0, 0), z_dir=(0, 1, 0))) as chamfer2_piece_2:
        with BuildLine():
            Line((CHAMFER2_SIZE_2, 0), (-0.078366679, 1.012978342))
            ThreePointArc((-0.078366679, 1.012978342), (-0.036411724, 0.52209249), (0, 0))
            Line((0, 0), (CHAMFER2_SIZE_2, 0))
        make_face()
    extrude(amount=45.5004749, mode=Mode.SUBTRACT)


with BuildPart() as body_2_1:
    add(body_2.part)

    # Cut-Extrude2: cut by cut_extrude2_tool
    add(cut_extrude2_tool.part, mode=Mode.SUBTRACT)

    # Chamfer3
    # the kernel refuses this chamfer: 1, 0.943713907 mm, written as the material it takes off along each edge
    with BuildSketch(Plane(origin=(-32.5, -2.612747277, 0), x_dir=(-1, 0, 0), z_dir=(0, 1, 0))) as chamfer3_piece_1:
        with BuildLine():
            Line((CHAMFER3_SIZE, 0), (-0.015881022, 1.015881022))
            ThreePointArc((-0.015881022, 1.015881022), (-0.00419828, 0.522370138), (0, 0))
            Line((0, 0), (CHAMFER3_SIZE, 0))
        make_face()
    extrude(amount=45.225494555, mode=Mode.SUBTRACT)
    with BuildSketch(Plane(origin=(32.438403167, -2.571682988, -2), x_dir=(0.046848125070118624, 0, 0.9989020238128535), z_dir=(0, 1, 0))) as chamfer3_piece_2:
        with BuildLine():
            Line((0.956251358, 0), (CHAMFER3_SIZE * 0.0468481250701, CHAMFER3_SIZE * 0.998902023813))
            Line((CHAMFER3_SIZE * 0.0468481250701, CHAMFER3_SIZE * 0.998902023813), (0, 0))
            ThreePointArc((0, 0), (0.491597341, 0.003514385), (0.956251358, 0))
        make_face()
    extrude(amount=45.143365976, mode=Mode.SUBTRACT)


solid = Compound([part_1.part, body_2_1.part])
